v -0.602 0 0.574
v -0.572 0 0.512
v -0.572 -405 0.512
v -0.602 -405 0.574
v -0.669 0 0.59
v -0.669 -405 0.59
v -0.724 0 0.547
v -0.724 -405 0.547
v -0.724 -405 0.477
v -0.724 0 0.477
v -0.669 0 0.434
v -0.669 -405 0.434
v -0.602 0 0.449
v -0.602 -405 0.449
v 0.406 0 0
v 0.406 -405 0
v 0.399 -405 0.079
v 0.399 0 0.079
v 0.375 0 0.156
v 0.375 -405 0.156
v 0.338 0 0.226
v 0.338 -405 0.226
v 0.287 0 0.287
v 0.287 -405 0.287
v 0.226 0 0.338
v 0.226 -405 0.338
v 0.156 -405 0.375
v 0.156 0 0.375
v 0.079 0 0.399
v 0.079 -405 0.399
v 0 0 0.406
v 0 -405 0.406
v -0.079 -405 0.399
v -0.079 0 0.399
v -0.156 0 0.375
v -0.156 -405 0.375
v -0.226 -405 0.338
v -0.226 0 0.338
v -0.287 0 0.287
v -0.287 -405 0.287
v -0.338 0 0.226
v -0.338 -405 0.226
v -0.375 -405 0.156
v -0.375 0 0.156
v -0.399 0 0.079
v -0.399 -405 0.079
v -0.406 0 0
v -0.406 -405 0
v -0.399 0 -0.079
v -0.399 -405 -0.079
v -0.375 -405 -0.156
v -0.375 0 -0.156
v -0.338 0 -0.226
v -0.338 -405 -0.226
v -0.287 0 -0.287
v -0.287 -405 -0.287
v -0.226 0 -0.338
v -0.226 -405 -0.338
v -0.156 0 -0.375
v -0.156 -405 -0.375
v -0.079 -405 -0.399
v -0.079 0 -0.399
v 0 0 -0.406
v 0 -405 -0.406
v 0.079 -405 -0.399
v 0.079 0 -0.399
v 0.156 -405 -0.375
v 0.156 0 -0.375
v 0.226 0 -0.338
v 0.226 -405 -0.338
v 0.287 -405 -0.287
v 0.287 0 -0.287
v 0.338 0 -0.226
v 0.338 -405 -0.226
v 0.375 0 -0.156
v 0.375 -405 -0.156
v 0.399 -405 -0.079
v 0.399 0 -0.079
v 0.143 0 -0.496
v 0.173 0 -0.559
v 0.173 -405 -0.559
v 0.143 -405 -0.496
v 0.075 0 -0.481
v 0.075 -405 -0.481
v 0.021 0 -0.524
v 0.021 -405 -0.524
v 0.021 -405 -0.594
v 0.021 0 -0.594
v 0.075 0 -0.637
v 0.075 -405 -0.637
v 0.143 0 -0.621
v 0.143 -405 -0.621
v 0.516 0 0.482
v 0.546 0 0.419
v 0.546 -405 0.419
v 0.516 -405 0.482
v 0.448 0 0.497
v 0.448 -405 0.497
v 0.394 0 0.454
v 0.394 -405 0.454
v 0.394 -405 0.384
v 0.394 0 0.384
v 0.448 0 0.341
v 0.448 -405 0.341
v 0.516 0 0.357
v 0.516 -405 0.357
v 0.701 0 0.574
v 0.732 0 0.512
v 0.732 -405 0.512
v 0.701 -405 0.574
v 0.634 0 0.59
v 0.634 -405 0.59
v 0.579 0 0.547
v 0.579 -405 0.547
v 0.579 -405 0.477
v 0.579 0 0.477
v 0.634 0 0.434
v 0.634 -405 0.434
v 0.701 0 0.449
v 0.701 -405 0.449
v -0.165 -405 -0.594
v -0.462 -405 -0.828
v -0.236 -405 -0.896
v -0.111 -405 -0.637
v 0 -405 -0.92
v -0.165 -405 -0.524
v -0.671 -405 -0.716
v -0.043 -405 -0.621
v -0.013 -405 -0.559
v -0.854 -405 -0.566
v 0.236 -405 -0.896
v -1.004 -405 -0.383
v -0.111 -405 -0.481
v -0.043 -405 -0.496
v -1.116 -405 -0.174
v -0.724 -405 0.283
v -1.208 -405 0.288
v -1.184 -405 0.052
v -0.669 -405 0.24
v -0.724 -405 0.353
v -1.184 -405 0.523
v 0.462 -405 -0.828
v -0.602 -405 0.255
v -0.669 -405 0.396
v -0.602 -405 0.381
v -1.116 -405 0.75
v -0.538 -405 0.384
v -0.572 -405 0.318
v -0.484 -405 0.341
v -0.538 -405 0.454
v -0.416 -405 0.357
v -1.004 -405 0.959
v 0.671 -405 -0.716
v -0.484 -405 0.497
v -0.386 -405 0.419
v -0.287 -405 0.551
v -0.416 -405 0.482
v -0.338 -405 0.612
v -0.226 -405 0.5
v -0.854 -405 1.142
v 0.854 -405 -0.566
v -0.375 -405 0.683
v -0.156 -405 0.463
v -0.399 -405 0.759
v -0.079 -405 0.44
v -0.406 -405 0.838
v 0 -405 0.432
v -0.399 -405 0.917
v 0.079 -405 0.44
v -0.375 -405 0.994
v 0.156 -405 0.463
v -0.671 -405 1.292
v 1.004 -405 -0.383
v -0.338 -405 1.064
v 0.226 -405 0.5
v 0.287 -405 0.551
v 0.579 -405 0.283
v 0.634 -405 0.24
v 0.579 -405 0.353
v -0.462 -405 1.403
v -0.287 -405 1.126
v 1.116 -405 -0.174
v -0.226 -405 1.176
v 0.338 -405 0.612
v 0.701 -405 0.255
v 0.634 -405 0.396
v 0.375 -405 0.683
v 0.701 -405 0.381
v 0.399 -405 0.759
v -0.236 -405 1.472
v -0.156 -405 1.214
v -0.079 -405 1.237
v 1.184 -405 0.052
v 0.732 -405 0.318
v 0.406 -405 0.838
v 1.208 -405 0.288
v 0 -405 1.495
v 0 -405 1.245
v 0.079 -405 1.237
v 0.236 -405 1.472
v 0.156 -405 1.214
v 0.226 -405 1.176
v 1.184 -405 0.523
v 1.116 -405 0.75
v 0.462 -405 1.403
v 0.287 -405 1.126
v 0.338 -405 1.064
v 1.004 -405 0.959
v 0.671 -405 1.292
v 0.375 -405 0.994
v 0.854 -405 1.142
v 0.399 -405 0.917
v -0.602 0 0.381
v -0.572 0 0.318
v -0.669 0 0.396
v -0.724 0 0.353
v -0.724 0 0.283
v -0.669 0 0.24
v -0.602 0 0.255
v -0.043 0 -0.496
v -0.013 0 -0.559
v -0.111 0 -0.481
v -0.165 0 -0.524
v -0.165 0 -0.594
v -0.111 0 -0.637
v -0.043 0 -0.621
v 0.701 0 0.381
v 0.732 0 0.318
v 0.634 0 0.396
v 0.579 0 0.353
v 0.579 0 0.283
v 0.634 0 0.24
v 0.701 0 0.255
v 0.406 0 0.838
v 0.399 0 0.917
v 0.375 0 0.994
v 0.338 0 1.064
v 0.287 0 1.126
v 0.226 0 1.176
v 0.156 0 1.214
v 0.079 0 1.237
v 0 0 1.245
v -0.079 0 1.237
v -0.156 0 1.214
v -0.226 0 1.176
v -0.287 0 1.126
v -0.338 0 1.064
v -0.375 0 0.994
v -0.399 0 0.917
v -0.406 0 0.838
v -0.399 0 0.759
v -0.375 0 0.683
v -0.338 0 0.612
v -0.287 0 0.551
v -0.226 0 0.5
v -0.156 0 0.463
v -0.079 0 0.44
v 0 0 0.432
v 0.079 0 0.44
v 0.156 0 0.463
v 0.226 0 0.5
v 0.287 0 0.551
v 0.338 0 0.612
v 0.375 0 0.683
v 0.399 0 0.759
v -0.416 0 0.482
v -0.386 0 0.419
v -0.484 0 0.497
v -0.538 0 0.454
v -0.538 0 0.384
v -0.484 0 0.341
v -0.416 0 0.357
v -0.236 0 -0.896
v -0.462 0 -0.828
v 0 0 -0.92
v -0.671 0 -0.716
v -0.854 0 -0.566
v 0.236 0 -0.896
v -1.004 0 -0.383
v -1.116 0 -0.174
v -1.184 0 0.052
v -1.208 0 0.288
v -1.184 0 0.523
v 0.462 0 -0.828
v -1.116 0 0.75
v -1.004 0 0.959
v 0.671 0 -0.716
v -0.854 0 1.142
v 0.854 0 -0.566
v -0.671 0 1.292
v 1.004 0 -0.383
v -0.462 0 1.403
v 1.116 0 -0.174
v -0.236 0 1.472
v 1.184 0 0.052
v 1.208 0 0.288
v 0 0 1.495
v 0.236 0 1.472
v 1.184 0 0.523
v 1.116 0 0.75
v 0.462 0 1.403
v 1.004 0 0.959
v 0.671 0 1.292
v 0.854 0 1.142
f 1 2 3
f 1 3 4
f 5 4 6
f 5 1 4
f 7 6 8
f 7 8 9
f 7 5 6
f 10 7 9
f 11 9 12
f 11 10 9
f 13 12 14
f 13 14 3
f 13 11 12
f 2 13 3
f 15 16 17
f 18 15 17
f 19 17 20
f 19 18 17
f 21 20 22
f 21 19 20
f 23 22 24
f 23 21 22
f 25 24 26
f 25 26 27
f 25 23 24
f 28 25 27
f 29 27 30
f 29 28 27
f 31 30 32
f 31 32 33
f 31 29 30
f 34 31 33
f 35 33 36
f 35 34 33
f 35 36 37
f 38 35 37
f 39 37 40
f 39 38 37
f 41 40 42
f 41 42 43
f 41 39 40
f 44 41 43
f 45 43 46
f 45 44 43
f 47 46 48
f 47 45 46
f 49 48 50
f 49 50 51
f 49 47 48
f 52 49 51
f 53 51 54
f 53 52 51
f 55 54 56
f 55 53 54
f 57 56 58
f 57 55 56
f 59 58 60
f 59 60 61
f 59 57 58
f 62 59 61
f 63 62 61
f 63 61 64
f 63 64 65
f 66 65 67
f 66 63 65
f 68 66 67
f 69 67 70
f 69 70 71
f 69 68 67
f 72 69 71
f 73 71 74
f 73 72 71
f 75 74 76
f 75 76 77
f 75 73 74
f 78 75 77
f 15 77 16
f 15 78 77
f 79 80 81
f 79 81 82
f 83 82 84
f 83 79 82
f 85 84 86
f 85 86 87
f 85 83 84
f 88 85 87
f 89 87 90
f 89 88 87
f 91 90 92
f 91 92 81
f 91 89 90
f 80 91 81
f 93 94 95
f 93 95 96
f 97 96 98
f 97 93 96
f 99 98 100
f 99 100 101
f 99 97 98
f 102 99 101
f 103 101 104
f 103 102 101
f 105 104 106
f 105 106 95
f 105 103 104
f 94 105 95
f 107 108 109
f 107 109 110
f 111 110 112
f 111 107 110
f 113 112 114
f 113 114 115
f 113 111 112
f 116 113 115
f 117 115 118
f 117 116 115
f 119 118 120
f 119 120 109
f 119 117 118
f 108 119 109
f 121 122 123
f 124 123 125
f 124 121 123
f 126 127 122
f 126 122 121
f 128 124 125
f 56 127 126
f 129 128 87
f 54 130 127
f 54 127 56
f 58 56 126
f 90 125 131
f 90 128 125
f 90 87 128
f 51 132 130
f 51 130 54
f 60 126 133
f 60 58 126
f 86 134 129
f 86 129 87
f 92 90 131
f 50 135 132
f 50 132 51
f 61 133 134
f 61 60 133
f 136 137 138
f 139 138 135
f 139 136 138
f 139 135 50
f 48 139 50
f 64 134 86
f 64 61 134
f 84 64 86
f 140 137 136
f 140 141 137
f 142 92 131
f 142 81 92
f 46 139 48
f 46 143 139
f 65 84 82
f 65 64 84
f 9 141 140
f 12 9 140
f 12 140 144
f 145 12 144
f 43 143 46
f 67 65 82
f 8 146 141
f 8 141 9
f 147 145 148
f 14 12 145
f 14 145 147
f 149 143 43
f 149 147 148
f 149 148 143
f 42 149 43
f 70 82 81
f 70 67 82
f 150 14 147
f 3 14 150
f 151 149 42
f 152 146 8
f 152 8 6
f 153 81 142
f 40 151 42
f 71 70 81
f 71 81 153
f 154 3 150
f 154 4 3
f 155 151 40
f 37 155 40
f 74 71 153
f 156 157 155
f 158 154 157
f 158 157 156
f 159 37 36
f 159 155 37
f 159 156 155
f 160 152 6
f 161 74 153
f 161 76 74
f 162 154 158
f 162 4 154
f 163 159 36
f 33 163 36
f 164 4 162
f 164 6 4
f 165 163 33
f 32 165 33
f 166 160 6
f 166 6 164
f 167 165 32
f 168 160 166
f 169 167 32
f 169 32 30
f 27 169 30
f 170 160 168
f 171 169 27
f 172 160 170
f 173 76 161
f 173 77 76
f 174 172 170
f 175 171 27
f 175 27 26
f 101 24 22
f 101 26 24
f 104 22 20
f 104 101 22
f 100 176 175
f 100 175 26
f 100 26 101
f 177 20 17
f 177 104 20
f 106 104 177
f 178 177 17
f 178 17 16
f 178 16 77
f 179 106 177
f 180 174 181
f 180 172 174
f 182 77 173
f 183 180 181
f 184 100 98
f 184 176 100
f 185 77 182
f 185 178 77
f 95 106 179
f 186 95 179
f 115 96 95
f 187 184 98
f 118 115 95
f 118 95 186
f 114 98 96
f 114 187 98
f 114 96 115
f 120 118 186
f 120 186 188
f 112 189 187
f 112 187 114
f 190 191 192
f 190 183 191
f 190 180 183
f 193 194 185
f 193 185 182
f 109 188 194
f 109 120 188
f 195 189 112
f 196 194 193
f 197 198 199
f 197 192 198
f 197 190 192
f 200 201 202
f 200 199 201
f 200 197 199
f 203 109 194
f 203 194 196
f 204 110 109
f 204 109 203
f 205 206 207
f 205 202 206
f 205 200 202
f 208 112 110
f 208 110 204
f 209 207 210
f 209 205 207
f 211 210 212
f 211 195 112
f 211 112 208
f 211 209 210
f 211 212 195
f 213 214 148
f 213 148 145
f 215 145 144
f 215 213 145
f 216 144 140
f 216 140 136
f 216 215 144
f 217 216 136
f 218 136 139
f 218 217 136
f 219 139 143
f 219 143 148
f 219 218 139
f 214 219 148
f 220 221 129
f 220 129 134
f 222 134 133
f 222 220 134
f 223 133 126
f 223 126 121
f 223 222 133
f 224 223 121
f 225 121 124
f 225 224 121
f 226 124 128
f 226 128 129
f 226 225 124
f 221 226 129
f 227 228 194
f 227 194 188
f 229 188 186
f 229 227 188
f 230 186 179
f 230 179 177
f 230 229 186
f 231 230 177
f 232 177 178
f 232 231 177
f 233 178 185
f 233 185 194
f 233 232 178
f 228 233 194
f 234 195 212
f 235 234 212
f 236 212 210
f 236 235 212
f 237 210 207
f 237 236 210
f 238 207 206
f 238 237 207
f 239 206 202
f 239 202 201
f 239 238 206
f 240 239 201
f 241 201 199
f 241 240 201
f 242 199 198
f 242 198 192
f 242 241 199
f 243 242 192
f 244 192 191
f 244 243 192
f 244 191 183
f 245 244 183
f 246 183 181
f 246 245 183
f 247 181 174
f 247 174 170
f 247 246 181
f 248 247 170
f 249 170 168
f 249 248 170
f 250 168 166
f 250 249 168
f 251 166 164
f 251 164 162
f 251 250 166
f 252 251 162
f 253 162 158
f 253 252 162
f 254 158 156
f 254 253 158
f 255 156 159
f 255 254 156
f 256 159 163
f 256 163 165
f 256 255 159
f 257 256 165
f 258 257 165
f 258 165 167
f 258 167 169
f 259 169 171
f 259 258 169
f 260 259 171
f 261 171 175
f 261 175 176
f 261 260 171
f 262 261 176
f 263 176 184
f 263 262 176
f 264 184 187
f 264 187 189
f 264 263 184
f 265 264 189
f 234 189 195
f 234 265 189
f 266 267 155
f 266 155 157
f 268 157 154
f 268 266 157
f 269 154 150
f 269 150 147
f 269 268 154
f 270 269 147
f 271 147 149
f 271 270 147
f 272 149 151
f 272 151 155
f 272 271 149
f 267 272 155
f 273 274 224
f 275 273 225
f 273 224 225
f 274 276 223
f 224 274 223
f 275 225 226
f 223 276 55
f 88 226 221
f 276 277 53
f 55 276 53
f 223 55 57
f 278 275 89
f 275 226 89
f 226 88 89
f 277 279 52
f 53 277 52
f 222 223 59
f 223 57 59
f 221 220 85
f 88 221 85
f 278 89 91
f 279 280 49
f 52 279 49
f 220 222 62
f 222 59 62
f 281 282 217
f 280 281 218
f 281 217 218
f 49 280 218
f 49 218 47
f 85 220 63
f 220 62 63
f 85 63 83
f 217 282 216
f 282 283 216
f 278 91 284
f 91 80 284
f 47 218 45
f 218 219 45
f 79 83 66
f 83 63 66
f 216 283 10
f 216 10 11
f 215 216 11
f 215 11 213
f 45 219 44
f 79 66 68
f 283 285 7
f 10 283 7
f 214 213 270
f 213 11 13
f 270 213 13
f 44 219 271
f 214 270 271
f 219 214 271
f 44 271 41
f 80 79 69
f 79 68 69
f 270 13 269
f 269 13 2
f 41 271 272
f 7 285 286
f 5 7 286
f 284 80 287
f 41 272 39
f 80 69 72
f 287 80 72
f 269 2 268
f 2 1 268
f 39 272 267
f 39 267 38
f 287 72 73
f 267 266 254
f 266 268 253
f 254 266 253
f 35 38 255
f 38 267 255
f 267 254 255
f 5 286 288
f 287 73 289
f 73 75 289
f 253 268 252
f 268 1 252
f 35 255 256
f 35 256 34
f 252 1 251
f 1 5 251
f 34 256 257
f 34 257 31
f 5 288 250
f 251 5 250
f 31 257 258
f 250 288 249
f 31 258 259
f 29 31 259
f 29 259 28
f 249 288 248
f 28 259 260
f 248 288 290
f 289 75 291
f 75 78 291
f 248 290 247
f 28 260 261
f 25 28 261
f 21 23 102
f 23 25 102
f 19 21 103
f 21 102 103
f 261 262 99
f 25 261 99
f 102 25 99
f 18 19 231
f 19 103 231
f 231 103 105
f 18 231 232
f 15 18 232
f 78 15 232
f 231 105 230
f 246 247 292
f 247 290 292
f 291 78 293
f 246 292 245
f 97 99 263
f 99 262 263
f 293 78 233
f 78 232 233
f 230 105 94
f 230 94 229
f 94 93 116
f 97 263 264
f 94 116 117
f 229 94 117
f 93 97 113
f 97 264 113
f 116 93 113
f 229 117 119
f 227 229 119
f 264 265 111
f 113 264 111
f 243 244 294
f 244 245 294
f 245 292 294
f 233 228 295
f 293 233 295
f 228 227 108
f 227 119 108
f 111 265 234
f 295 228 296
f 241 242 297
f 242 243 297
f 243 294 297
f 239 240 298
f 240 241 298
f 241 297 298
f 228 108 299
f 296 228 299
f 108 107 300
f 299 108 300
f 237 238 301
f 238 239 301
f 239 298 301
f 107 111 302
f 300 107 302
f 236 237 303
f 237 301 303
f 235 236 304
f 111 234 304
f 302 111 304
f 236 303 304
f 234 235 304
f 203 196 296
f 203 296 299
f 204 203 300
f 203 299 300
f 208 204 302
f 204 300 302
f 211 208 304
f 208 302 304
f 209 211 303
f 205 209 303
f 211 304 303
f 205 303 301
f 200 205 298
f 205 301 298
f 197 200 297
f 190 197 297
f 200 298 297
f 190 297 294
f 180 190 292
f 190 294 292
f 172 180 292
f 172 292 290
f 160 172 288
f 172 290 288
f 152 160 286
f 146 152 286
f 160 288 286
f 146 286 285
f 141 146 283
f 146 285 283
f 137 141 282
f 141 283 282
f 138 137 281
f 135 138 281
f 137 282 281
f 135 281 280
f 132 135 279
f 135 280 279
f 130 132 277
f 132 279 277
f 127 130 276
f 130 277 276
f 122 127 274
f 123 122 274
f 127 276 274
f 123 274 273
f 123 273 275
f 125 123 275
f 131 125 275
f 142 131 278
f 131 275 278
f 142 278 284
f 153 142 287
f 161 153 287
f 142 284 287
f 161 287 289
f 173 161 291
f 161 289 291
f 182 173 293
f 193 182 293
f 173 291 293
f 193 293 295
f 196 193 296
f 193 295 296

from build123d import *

# Parameters (mm, degrees)
F0_R     = 1.2075
F0_R_2   = 1.2
F0_R_3   = 1.05
F0_R_4   = 0.4064
F0_R_5   = 0.2205357301
F0_R_6   = 0.08001
F1_DEPTH = 405


with BuildPart() as f1:
    # F0 (on Front) → F1 (new body)
    with BuildSketch(Plane.XZ):
        with Locations((0, 0.2878)):
            Circle(F0_R)
        with Locations((0, 0.2878)):
            Circle(F0_R_2, mode=Mode.SUBTRACT)
        with Locations((0, 0.2878)):
            Circle(F0_R_2)
        with Locations((0, 0.2878)):
            Circle(F0_R_3, mode=Mode.SUBTRACT)
        with Locations((0, 0.2878)):
            Circle(F0_R_3)
        with BuildLine():
            add(Edge.make_bspline(
                [(0.2313024888, -0.5588), (0.2313024888, -0.3679270245), (-0.1156512444, -0.4633635122), (-0.4626049777, -0.5588), (-0.1156512444, -0.6542364878), (0.2313024888, -0.7496729755), (0.2313024888, -0.5588)],
                knots=[0, 0, 0, 2.0943951024, 2.0943951024, 4.1887902048, 4.1887902048, 6.2831853072, 6.2831853072, 6.2831853072], degree=2, weights=[1, 0.5, 1, 0.5, 1, 0.5, 1]))
        make_face(mode=Mode.SUBTRACT)
        Circle(F0_R_4, mode=Mode.SUBTRACT)
        with Locations((-0.5588, 0.4191)):
            Circle(F0_R_5, mode=Mode.SUBTRACT)
        with Locations((0, 0.8382)):
            Circle(F0_R_4, mode=Mode.SUBTRACT)
        with Locations((0.5588, 0.4191)):
            Circle(F0_R_5, mode=Mode.SUBTRACT)
        with Locations((-0.5588, 0.4191)):
            Circle(F0_R_5)
        with Locations((-0.65151, 0.318008)):
            Circle(F0_R_6, mode=Mode.SUBTRACT)
        with Locations((-0.65151, 0.51181)):
            Circle(F0_R_6, mode=Mode.SUBTRACT)
        with Locations((-0.46609, 0.4191)):
            Circle(F0_R_6, mode=Mode.SUBTRACT)
        with Locations((0.5588, 0.4191)):
            Circle(F0_R_5)
        with Locations((0.46609, 0.4191)):
            Circle(F0_R_6, mode=Mode.SUBTRACT)
        with Locations((0.65151, 0.318008)):
            Circle(F0_R_6, mode=Mode.SUBTRACT)
        with Locations((0.65151, 0.51181)):
            Circle(F0_R_6, mode=Mode.SUBTRACT)
        with BuildLine():
            add(Edge.make_bspline(
                [(0.2313024888, -0.5588), (0.2313024888, -0.3679270245), (-0.1156512444, -0.4633635122), (-0.4626049777, -0.5588), (-0.1156512444, -0.6542364878), (0.2313024888, -0.7496729755), (0.2313024888, -0.5588)],
                knots=[0, 0, 0, 2.0943951024, 2.0943951024, 4.1887902048, 4.1887902048, 6.2831853072, 6.2831853072, 6.2831853072], degree=2, weights=[1, 0.5, 1, 0.5, 1, 0.5, 1]))
        make_face()
        with Locations((-0.09271, -0.5588)):
            Circle(F0_R_6, mode=Mode.SUBTRACT)
        with Locations((0.09271, -0.5588)):
            Circle(F0_R_6, mode=Mode.SUBTRACT)
    extrude(amount=F1_DEPTH)


solid = f1.part
